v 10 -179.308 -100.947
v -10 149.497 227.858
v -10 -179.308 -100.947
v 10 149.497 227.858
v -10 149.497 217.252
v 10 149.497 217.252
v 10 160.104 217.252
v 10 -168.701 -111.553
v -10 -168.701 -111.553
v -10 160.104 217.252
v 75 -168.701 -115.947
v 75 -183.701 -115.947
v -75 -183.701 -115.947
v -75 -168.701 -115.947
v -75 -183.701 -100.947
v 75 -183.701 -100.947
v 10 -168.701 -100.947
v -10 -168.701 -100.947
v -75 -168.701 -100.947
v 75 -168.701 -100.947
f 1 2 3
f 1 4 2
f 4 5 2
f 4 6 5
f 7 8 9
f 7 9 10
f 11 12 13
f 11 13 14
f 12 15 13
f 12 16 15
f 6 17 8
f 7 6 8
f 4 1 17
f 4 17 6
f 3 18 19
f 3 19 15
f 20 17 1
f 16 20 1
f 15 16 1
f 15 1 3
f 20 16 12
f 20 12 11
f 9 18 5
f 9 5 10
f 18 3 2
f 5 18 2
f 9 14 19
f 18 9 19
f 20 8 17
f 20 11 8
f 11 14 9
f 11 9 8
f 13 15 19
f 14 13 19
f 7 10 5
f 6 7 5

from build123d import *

# Parameters (mm, degrees)
F1_DEPTH = 10
F2_DEPTH = 75


with BuildPart() as f1:
    # F0 (on Right) → F1 (new body, symmetric)
    with BuildSketch(Plane.YZ):
        Polygon((149.497071, 227.858104), (-179.307582, -100.946549), (-168.700981, -100.946549), (-168.700981, -111.553151), (160.103673, 217.251502), (149.497071, 217.251502), align=None)
    extrude(amount=F1_DEPTH, both=True)

    # F0 (on Right) → F2 (join, symmetric)
    with BuildSketch(Plane.YZ):
        Polygon((-168.700981, -111.553151), (-179.307582, -100.946549), (-183.700981, -100.946549), (-183.700981, -115.946549), (-168.700981, -115.946549), align=None)
        Polygon((-168.700981, -100.946549), (-179.307582, -100.946549), (-168.700981, -111.553151), align=None)
    extrude(amount=F2_DEPTH, both=True)


solid = f1.part
